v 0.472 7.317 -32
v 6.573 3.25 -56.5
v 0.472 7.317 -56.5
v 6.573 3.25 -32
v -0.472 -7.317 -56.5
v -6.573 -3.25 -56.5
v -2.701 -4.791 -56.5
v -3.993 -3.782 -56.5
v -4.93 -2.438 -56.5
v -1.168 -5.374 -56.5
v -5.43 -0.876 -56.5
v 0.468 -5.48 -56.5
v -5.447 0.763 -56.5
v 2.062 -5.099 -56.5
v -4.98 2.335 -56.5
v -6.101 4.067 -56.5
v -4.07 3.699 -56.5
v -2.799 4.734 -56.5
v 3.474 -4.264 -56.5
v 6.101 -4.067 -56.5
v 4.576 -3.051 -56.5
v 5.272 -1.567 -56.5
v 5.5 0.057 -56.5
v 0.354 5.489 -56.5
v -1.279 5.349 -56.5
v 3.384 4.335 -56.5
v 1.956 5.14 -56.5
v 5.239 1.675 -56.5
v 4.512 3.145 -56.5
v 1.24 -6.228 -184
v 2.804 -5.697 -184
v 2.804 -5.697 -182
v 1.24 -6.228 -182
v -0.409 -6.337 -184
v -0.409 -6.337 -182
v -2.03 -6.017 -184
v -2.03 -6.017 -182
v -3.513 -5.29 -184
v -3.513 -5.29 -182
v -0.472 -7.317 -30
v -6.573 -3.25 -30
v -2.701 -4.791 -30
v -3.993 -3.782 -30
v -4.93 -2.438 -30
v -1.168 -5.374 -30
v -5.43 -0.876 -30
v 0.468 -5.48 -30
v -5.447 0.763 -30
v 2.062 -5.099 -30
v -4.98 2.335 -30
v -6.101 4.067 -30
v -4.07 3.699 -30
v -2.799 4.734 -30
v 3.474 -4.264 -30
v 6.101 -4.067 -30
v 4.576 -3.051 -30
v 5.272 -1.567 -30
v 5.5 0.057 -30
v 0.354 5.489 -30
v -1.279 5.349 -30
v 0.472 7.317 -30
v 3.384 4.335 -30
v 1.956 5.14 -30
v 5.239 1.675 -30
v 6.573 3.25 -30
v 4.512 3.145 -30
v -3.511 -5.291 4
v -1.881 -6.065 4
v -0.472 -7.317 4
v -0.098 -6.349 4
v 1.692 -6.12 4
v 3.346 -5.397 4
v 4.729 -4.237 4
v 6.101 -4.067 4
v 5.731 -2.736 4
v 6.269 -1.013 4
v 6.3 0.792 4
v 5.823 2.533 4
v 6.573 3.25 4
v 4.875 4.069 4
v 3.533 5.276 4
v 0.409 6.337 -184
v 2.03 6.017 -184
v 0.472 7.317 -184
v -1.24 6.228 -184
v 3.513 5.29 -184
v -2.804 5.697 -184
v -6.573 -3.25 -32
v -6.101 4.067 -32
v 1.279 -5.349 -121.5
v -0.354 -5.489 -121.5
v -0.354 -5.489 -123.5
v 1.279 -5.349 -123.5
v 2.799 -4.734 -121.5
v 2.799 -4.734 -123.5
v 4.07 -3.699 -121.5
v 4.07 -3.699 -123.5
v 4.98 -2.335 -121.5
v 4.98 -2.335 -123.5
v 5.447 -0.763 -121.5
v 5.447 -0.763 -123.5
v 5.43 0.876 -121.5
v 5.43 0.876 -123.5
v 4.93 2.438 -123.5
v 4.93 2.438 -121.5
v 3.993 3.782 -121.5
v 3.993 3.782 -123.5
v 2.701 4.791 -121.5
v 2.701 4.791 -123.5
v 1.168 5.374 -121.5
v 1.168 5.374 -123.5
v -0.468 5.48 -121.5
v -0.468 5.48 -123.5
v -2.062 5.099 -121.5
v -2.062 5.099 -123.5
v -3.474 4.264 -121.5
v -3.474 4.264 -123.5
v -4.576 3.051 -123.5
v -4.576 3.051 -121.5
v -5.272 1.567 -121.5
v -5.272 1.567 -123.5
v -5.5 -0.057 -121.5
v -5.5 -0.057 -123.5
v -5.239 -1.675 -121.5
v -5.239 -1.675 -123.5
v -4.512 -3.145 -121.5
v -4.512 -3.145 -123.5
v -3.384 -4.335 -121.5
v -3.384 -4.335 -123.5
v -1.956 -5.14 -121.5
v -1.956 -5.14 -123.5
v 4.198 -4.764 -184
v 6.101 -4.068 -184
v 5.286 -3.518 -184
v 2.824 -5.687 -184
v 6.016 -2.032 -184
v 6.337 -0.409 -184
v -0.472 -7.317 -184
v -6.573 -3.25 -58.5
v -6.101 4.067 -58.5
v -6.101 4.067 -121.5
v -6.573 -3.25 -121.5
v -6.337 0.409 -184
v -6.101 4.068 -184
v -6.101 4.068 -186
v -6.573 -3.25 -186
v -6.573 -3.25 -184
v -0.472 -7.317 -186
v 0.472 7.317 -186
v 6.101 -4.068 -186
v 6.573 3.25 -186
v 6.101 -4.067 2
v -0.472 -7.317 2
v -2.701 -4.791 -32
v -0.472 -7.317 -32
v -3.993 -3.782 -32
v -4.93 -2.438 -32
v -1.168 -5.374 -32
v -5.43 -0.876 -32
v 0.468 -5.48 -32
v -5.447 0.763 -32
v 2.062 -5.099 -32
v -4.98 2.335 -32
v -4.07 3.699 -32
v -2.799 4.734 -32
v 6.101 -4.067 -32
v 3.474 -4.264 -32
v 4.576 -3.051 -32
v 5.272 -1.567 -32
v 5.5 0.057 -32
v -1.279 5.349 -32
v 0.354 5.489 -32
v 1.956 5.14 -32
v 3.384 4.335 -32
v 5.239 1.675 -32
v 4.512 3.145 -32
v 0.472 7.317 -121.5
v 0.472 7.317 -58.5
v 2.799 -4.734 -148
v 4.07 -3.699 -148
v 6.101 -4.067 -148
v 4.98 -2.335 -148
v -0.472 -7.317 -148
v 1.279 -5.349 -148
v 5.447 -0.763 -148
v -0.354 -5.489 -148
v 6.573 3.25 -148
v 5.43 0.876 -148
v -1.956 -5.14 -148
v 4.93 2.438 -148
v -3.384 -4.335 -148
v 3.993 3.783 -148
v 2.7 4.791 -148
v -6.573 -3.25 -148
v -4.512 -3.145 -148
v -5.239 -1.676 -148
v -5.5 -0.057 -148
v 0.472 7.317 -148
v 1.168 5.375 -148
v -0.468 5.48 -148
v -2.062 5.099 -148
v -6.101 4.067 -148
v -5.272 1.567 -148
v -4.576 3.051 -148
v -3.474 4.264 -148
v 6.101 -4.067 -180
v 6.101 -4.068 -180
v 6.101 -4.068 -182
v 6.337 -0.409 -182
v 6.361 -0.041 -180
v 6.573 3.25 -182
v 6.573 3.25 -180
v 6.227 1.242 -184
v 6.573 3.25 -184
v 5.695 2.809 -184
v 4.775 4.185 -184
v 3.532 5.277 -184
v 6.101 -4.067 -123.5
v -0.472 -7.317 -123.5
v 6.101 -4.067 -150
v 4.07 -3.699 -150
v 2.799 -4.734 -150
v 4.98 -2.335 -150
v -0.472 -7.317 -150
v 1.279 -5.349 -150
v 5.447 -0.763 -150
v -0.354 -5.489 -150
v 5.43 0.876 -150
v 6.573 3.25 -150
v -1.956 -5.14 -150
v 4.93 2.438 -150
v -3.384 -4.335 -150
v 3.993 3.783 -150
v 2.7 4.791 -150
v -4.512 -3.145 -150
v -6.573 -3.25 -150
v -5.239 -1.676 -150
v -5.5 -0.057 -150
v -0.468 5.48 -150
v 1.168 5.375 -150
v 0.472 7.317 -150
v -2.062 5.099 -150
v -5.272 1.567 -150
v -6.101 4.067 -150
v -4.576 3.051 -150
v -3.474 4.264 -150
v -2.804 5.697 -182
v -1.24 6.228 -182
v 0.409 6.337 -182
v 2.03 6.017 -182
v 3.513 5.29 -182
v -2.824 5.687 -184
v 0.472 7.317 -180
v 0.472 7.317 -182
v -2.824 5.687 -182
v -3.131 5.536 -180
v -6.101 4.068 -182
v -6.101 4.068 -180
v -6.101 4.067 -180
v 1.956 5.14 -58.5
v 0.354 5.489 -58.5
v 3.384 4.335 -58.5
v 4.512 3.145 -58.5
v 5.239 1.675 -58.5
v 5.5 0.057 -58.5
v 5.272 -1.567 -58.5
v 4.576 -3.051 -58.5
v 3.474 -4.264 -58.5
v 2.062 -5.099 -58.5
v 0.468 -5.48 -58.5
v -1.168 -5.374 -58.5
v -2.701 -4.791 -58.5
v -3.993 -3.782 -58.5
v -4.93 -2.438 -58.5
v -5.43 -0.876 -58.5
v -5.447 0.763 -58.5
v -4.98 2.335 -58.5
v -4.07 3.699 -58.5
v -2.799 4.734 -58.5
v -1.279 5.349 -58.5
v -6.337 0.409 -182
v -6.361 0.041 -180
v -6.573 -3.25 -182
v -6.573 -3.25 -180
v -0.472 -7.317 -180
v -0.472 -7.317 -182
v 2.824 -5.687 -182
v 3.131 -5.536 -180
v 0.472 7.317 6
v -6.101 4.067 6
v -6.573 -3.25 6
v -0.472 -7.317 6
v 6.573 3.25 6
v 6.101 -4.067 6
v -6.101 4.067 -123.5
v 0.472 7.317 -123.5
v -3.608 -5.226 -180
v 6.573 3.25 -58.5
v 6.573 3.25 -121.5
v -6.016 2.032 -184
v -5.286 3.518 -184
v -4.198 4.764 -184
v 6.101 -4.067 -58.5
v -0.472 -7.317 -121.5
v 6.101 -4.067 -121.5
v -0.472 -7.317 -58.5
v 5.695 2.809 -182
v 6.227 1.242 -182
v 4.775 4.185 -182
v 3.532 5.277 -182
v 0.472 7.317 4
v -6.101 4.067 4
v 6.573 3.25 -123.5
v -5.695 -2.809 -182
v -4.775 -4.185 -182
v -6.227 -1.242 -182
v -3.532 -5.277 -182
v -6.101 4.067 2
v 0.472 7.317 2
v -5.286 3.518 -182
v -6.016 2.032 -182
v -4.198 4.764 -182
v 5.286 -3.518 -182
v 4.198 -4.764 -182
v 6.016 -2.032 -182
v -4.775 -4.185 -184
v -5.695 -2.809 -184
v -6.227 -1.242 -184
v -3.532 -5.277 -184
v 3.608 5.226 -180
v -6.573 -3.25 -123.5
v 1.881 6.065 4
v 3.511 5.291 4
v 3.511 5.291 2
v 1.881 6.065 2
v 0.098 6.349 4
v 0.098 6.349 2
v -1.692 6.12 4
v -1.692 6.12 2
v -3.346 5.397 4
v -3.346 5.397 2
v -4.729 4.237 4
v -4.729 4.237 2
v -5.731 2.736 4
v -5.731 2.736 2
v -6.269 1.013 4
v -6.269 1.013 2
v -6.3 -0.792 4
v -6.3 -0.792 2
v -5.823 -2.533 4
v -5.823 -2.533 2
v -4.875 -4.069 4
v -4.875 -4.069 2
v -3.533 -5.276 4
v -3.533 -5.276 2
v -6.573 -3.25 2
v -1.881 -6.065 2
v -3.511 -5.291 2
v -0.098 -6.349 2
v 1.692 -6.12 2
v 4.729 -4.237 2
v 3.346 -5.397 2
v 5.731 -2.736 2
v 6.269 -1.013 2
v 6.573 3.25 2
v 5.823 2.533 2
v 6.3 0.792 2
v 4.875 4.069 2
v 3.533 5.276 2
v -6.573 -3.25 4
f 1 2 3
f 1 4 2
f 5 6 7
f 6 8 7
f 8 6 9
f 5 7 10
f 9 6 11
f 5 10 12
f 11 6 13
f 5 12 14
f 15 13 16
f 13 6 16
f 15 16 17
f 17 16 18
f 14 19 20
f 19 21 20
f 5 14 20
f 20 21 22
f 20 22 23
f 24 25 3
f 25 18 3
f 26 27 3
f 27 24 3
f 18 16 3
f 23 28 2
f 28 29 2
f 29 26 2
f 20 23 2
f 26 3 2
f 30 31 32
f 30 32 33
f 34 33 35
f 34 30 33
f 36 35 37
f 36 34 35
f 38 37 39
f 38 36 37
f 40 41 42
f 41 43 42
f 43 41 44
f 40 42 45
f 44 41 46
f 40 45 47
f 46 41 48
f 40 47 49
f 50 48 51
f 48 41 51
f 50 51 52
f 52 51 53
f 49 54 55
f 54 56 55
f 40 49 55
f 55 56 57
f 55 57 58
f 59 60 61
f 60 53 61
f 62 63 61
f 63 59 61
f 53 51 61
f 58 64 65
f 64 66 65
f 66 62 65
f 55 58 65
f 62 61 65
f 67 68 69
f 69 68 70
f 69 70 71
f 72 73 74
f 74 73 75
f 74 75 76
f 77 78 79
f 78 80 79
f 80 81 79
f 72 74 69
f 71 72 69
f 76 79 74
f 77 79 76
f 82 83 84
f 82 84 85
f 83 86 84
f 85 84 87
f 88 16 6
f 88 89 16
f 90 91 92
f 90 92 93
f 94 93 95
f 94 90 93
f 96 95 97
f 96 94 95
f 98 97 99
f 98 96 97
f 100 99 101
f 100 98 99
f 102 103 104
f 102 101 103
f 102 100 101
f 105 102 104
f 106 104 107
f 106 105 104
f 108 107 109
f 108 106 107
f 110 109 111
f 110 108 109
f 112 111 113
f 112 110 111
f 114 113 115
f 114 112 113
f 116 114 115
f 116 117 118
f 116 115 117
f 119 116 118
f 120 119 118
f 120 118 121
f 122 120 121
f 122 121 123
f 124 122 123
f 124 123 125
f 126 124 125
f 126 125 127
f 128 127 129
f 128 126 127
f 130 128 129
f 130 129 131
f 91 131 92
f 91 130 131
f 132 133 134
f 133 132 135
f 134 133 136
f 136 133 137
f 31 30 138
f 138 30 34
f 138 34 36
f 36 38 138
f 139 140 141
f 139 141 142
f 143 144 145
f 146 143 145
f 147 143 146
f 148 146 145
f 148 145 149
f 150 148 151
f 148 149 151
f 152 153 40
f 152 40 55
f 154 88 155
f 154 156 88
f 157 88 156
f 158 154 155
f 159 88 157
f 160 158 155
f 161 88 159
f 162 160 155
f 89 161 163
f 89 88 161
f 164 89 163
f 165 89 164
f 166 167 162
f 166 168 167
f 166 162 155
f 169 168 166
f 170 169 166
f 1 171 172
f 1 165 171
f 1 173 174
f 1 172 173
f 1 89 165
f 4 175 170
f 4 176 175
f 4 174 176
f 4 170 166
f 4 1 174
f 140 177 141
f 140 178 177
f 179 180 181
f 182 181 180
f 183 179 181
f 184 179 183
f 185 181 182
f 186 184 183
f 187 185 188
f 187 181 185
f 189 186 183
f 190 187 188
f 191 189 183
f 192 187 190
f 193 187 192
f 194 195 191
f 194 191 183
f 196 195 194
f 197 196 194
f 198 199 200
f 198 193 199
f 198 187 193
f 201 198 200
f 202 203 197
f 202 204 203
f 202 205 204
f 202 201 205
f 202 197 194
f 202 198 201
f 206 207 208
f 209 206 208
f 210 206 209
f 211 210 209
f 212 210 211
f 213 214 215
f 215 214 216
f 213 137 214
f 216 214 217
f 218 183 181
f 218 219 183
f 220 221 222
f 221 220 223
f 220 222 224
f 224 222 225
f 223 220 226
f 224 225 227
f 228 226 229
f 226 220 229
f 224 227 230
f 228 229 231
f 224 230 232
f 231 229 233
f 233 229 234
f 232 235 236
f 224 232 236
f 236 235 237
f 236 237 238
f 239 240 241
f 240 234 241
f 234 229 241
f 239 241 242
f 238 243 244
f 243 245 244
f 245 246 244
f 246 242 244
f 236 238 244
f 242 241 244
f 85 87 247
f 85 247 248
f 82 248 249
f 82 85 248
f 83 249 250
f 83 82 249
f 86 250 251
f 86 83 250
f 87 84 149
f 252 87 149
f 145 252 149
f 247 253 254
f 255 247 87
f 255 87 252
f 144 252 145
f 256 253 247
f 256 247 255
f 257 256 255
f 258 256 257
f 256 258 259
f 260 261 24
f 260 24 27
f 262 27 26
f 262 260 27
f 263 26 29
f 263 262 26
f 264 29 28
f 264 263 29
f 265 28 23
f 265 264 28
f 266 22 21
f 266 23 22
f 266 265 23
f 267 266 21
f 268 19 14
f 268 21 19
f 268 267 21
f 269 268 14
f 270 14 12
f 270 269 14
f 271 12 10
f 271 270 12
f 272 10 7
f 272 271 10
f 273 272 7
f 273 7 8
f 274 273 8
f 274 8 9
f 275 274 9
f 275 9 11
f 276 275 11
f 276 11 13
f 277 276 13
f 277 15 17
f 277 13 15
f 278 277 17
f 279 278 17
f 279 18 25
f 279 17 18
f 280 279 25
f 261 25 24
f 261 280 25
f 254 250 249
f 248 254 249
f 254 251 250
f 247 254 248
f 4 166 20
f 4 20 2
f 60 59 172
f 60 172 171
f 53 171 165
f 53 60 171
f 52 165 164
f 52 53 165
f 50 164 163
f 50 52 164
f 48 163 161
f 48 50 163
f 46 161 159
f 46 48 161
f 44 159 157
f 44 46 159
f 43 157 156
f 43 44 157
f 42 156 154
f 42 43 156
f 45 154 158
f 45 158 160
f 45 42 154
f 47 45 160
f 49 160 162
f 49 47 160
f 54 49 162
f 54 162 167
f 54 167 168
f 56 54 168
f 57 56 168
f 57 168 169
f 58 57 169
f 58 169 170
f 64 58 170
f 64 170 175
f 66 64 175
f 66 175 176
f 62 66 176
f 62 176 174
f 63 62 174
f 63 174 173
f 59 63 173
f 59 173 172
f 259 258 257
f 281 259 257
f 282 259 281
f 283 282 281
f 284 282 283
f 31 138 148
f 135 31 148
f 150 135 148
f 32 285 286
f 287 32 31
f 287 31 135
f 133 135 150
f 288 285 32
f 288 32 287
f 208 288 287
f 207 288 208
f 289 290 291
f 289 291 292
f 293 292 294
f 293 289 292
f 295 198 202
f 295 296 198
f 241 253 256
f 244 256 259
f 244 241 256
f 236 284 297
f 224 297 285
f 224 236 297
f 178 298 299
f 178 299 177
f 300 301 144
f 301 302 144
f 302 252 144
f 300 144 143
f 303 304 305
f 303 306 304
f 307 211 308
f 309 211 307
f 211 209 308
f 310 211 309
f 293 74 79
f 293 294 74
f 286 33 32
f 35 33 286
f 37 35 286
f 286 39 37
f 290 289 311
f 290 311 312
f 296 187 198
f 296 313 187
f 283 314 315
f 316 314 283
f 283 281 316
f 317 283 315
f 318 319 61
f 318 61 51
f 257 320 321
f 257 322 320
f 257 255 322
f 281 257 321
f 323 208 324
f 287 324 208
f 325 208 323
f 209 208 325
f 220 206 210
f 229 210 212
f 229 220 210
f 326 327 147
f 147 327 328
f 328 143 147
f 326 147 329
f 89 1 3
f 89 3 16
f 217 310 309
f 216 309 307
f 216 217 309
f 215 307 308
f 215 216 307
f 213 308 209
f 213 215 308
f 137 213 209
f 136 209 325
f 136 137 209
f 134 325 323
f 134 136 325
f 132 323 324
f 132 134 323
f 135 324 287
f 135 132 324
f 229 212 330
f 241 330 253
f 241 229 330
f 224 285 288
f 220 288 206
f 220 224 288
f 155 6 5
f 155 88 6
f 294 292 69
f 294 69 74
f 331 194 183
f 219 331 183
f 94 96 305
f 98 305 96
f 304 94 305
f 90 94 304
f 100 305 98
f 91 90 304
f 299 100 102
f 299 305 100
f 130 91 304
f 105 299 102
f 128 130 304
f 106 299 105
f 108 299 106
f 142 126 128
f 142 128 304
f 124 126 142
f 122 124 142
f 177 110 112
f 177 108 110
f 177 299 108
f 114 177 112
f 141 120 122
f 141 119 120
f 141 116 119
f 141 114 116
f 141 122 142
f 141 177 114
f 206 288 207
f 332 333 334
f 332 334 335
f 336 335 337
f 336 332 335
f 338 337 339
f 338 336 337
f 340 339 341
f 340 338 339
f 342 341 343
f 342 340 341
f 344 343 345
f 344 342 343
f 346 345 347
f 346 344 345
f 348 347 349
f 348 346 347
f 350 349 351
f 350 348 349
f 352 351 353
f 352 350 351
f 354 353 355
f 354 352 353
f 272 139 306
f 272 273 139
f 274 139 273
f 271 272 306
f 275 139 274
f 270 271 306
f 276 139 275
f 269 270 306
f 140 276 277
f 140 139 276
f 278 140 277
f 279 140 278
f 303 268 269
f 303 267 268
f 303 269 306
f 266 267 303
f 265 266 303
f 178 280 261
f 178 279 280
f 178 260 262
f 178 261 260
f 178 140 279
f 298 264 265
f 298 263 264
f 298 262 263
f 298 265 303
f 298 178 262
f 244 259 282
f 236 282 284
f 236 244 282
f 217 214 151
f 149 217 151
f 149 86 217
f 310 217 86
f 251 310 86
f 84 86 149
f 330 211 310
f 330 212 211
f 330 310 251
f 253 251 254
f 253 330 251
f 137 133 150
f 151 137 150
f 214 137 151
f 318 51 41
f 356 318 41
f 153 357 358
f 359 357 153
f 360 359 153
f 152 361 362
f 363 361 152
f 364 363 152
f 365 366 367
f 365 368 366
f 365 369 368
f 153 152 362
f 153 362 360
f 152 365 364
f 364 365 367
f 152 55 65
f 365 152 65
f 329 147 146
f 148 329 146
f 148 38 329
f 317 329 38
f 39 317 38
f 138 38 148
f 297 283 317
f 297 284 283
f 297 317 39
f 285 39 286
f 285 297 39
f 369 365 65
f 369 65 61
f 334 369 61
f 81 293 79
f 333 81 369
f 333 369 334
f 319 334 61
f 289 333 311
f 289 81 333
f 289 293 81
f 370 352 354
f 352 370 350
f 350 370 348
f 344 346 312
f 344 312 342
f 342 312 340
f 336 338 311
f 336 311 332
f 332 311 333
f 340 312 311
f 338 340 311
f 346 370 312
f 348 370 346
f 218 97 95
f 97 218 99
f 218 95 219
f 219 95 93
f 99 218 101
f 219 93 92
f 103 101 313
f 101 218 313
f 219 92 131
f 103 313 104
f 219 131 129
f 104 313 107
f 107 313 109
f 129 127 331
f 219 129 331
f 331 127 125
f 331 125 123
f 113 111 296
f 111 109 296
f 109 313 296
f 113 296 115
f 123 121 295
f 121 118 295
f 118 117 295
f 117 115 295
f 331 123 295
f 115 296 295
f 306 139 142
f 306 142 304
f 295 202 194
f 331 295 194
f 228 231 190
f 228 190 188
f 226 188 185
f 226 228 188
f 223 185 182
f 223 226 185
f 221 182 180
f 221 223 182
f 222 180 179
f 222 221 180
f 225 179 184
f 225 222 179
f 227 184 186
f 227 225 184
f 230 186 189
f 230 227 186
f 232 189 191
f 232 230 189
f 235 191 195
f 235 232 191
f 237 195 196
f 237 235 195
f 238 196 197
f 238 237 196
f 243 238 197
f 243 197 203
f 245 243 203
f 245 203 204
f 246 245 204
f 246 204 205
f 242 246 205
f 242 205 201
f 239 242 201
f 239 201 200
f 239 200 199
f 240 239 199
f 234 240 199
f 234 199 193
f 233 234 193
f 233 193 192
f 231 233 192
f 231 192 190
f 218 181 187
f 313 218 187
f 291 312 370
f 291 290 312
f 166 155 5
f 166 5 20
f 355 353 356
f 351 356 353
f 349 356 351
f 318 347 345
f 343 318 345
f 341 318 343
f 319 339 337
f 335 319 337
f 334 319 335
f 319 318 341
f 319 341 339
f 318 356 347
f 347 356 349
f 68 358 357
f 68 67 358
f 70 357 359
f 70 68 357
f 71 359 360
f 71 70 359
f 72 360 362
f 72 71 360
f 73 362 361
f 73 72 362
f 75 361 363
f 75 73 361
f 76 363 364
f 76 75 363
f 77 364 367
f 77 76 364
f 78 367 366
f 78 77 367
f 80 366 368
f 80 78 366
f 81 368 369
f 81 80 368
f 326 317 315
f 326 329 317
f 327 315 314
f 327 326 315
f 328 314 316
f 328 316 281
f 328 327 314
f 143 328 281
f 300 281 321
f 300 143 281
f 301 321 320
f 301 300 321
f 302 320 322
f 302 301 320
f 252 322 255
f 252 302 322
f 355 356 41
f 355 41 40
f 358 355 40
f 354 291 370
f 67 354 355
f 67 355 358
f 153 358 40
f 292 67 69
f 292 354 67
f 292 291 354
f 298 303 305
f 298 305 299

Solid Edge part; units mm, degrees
sketch "Sketch1" plane through (0, 0, 0) normal (0, 0, 1) x (1, 0, 0)
  line L0 (-6.1009, 4.0673) -> (-6.5728, -3.2499)
  line L1 (-6.5728, -3.2499) -> (-0.4719, -7.3171)
  line L2 (-0.4719, -7.3171) -> (6.1009, -4.0673)
  line L3 (6.1009, -4.0673) -> (6.5728, 3.2499)
  line L4 (6.5728, 3.2499) -> (0.4719, 7.3171)
  line L5 (0.4719, 7.3171) -> (-6.1009, 4.0673)
extrude "Protrusion1" add sketch "Sketch1" against normal blind 180
sketch "Sketch2" plane through (0, 0, -30) normal (0, 0, 1) x (0.0644, 0.9979, 0)
  circle A0 centre (0, 0) radius 5.5
  circle A1 centre (0, 0) radius 13.1424
extrude "ExtrudedCutout_3" cut sketch "Sketch2" against normal blind 2
sketch "Sketch3" plane through (0, 0, -150) normal (0, 0, -1) x (0.8964, 0.4432, 0)
  circle A0 centre (0, 0) radius 13.1424
  circle A1 centre (0, 0) radius 5.5
extrude "ExtrudedCutout_5" cut sketch "Sketch3" against normal blind 2
sketch "Sketch4" plane through (0, 0, -58.5) normal (0, 0, 1) x (0.0644, 0.9979, 0)
  circle A0 centre (0, 0) radius 5.5
  circle A1 centre (0, 0) radius 13.1424
extrude "ExtrudedCutout_7" cut sketch "Sketch4" along normal blind 2
sketch "Sketch5" plane through (0, 0, -121.5) normal (0, 0, -1) x (-0.0644, -0.9979, 0)
  circle A0 centre (0, 0) radius 5.5
  circle A1 centre (0, 0) radius 13.1424
extrude "ExtrudedCutout_8" cut sketch "Sketch5" along normal blind 2
sketch "Sketch6" plane through (0, 0, -180) normal (0, 0, -1) x (-0.0644, -0.9979, 0)
  line L0 (3.6662, -6.35) -> (-3.6662, -6.35)
  line L1 (-3.6662, -6.35) -> (-7.3323, 0)
  line L2 (-7.3323, 0) -> (-3.6662, 6.35)
  line L3 (-3.6662, 6.35) -> (3.6662, 6.35)
  line L4 (3.6662, 6.35) -> (7.3323, 0)
  line L5 (7.3323, 0) -> (3.6662, -6.35)
extrude "ExtrudedProtrusion_2" add sketch "Sketch6" along normal blind 6
sketch "Sketch7" plane through (0, 0, 0) normal (0, 0, 1) x (1, 0, 0)
  line L0 (-6.1009, 4.0673) -> (-6.5728, -3.2499)
  line L1 (-6.5728, -3.2499) -> (-0.4719, -7.3171)
  line L2 (-0.4719, -7.3171) -> (6.1009, -4.0673)
  line L3 (6.1009, -4.0673) -> (6.5728, 3.2499)
  line L4 (6.5728, 3.2499) -> (0.4719, 7.3171)
  line L5 (0.4719, 7.3171) -> (-6.1009, 4.0673)
extrude "ExtrudedProtrusion_3" add sketch "Sketch7" along normal blind 6
sketch "Sketch8" plane through (0, 0, 4) normal (0, 0, 1) x (-0.8964, -0.4432, 0)
  circle A0 centre (0, 0) radius 6.35
  circle A1 centre (0, 0) radius 13.1424
extrude "ExtrudedCutout_9" cut sketch "Sketch8" against normal blind 2
sketch "Sketch9" plane through (0, 0, -184) normal (0, 0, -1) x (0.8964, 0.4432, 0)
  circle A0 centre (0, 0) radius 6.35
  circle A1 centre (0, 0) radius 13.1424
extrude "ExtrudedCutout_10" cut sketch "Sketch9" against normal blind 2
properties part number "BumbleB0517"
